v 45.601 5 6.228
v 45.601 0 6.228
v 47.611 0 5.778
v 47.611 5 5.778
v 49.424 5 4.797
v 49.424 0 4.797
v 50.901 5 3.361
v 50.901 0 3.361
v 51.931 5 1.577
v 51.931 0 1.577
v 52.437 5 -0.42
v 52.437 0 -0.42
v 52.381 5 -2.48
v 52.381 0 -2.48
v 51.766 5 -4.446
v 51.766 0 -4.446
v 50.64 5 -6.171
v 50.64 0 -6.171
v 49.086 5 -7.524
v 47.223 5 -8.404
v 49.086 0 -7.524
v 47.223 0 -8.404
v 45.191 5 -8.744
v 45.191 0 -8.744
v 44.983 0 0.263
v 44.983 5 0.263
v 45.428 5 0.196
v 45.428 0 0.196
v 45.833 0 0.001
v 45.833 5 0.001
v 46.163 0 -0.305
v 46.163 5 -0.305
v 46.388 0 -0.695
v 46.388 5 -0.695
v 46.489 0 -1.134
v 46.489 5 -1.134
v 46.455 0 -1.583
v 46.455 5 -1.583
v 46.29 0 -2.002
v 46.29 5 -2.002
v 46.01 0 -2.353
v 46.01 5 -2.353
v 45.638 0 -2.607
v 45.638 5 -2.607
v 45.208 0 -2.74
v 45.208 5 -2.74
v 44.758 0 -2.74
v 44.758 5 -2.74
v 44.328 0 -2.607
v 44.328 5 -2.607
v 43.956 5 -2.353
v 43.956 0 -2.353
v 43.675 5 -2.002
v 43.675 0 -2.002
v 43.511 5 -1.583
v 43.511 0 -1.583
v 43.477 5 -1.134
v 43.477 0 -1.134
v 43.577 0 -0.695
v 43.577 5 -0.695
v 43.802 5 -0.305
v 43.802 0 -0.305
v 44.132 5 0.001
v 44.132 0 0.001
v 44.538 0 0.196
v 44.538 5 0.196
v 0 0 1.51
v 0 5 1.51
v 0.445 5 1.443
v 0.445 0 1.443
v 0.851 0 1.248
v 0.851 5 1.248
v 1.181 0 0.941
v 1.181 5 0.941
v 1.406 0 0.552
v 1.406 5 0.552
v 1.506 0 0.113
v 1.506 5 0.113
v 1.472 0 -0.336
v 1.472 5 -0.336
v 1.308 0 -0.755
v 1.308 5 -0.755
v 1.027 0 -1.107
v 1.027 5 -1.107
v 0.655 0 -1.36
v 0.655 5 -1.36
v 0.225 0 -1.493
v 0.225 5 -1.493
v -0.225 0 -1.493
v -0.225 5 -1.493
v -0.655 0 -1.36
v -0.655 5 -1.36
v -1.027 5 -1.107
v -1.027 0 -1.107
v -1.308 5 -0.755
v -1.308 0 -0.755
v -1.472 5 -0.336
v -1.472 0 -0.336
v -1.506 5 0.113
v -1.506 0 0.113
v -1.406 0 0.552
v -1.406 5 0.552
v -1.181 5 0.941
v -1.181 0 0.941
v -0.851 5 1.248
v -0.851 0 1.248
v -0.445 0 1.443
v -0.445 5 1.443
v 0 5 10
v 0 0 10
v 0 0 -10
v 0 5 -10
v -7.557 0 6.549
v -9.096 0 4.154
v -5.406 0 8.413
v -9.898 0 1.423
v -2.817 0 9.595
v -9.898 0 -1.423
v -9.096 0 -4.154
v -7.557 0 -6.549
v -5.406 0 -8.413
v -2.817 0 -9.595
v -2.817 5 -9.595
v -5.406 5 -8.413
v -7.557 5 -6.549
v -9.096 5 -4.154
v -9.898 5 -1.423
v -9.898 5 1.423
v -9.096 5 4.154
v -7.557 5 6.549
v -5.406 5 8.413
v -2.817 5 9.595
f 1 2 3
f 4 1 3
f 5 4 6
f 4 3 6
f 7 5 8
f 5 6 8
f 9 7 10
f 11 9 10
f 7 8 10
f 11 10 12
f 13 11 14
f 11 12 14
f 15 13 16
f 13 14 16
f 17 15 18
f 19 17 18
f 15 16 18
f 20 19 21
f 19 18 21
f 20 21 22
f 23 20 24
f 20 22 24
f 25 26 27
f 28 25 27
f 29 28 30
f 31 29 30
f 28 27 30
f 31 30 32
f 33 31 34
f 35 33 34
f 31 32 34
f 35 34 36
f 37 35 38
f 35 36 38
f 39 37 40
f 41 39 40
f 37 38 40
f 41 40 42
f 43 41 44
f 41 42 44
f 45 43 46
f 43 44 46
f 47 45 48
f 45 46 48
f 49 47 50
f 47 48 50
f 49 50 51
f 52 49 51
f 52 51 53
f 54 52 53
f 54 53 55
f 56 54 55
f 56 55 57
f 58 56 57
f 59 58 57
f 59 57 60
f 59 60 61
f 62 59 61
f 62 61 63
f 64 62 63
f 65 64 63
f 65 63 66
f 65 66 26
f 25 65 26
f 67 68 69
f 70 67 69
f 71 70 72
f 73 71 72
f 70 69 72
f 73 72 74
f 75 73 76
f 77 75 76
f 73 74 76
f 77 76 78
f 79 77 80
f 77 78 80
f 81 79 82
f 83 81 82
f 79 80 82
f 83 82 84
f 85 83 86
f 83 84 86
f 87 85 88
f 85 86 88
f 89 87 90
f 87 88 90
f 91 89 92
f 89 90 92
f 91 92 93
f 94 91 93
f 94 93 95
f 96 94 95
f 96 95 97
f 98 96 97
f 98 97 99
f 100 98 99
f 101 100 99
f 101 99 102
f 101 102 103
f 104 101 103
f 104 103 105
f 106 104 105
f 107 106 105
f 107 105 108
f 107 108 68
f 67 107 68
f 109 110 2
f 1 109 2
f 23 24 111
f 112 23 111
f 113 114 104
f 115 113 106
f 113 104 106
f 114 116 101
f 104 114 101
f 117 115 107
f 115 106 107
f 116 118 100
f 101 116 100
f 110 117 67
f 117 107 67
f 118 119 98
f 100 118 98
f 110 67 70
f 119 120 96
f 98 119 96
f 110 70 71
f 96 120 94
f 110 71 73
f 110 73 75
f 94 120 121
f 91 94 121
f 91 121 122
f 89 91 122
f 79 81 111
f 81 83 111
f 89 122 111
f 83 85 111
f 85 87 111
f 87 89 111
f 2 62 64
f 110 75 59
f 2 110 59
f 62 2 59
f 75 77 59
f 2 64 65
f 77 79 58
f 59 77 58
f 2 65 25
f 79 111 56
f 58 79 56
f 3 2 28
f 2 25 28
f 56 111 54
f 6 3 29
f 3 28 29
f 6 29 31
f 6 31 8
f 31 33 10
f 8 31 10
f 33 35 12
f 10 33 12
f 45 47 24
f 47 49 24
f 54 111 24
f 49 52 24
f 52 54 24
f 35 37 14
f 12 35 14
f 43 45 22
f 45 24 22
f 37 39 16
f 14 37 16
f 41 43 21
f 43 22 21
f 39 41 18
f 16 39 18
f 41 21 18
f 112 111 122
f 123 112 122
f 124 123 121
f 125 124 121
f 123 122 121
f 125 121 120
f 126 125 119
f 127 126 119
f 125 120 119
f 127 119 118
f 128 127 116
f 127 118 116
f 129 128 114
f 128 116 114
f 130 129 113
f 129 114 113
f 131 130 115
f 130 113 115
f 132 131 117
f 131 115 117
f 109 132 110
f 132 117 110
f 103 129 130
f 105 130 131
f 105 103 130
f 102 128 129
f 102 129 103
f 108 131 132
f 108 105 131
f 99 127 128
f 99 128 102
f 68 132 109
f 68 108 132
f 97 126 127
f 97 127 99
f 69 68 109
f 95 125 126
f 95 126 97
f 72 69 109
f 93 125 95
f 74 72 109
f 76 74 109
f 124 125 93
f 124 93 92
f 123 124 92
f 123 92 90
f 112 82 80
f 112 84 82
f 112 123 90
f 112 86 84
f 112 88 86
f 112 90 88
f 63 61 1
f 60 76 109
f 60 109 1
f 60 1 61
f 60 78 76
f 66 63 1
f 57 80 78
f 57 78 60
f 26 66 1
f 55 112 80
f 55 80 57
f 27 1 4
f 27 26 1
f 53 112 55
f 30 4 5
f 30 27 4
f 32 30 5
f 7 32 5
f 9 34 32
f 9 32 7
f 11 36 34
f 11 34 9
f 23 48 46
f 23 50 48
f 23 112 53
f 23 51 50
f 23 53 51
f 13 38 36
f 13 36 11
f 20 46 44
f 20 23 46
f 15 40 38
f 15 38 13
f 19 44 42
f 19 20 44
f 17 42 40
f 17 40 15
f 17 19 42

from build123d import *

# Parameters (mm, degrees)
BOSS_EXTRUDE1_DEPTH = 5
CUT_EXTRUDE1_REACH  = 55.66
SKETCH2_R           = 1.51


with BuildPart() as part:
    # Sketch1 → Boss-Extrude1 (new body)
    with BuildSketch(Plane(origin=(0, 0, 0), x_dir=(1, 0, 0), z_dir=(0, 1, 0))):
        with BuildLine():
            ThreePointArc((0, 10), (-10, 0), (0, -10))
            Line((0, -10), (45.601011206, -6.227938292))
            ThreePointArc((45.601011206, -6.227938292), (52.479923025, 1.451771759), (45.191159304, 8.743636932))
            Line((45.191159304, 8.743636932), (0, 10))
        make_face()
    extrude(amount=BOSS_EXTRUDE1_DEPTH)

    # Sketch2 → Cut-Extrude1 (cut, up to next)
    with BuildSketch(Plane(origin=(0, 5, 0), x_dir=(1, 0, 0), z_dir=(0, 1, 0)), mode=Mode.PRIVATE) as cut_extrude1_sk1:
        with Locations(Location((0, 0, 0), (0, 0, 270))):
            Circle(SKETCH2_R)
    cut_extrude1_tool1 = extrude(cut_extrude1_sk1.sketch, amount=-CUT_EXTRUDE1_REACH, mode=Mode.PRIVATE) & part.part
    # Sketch2 → Cut-Extrude1 (cut, up to next)
    with BuildSketch(Plane(origin=(0, 5, 0), x_dir=(1, 0, 0), z_dir=(0, 1, 0)), mode=Mode.PRIVATE) as cut_extrude1_sk2:
        with Locations(Location((44.98273173, 1.246533628, 0), (0, 0, 270))):
            Circle(SKETCH2_R)
    cut_extrude1_tool2 = extrude(cut_extrude1_sk2.sketch, amount=-CUT_EXTRUDE1_REACH, mode=Mode.PRIVATE) & part.part
    add(cut_extrude1_tool1.solids().sort_by_distance((0, 5, 0))[0], mode=Mode.SUBTRACT)
    add(cut_extrude1_tool2.solids().sort_by_distance((44.982732, 5, -1.246534))[0], mode=Mode.SUBTRACT)


solid = part.part
